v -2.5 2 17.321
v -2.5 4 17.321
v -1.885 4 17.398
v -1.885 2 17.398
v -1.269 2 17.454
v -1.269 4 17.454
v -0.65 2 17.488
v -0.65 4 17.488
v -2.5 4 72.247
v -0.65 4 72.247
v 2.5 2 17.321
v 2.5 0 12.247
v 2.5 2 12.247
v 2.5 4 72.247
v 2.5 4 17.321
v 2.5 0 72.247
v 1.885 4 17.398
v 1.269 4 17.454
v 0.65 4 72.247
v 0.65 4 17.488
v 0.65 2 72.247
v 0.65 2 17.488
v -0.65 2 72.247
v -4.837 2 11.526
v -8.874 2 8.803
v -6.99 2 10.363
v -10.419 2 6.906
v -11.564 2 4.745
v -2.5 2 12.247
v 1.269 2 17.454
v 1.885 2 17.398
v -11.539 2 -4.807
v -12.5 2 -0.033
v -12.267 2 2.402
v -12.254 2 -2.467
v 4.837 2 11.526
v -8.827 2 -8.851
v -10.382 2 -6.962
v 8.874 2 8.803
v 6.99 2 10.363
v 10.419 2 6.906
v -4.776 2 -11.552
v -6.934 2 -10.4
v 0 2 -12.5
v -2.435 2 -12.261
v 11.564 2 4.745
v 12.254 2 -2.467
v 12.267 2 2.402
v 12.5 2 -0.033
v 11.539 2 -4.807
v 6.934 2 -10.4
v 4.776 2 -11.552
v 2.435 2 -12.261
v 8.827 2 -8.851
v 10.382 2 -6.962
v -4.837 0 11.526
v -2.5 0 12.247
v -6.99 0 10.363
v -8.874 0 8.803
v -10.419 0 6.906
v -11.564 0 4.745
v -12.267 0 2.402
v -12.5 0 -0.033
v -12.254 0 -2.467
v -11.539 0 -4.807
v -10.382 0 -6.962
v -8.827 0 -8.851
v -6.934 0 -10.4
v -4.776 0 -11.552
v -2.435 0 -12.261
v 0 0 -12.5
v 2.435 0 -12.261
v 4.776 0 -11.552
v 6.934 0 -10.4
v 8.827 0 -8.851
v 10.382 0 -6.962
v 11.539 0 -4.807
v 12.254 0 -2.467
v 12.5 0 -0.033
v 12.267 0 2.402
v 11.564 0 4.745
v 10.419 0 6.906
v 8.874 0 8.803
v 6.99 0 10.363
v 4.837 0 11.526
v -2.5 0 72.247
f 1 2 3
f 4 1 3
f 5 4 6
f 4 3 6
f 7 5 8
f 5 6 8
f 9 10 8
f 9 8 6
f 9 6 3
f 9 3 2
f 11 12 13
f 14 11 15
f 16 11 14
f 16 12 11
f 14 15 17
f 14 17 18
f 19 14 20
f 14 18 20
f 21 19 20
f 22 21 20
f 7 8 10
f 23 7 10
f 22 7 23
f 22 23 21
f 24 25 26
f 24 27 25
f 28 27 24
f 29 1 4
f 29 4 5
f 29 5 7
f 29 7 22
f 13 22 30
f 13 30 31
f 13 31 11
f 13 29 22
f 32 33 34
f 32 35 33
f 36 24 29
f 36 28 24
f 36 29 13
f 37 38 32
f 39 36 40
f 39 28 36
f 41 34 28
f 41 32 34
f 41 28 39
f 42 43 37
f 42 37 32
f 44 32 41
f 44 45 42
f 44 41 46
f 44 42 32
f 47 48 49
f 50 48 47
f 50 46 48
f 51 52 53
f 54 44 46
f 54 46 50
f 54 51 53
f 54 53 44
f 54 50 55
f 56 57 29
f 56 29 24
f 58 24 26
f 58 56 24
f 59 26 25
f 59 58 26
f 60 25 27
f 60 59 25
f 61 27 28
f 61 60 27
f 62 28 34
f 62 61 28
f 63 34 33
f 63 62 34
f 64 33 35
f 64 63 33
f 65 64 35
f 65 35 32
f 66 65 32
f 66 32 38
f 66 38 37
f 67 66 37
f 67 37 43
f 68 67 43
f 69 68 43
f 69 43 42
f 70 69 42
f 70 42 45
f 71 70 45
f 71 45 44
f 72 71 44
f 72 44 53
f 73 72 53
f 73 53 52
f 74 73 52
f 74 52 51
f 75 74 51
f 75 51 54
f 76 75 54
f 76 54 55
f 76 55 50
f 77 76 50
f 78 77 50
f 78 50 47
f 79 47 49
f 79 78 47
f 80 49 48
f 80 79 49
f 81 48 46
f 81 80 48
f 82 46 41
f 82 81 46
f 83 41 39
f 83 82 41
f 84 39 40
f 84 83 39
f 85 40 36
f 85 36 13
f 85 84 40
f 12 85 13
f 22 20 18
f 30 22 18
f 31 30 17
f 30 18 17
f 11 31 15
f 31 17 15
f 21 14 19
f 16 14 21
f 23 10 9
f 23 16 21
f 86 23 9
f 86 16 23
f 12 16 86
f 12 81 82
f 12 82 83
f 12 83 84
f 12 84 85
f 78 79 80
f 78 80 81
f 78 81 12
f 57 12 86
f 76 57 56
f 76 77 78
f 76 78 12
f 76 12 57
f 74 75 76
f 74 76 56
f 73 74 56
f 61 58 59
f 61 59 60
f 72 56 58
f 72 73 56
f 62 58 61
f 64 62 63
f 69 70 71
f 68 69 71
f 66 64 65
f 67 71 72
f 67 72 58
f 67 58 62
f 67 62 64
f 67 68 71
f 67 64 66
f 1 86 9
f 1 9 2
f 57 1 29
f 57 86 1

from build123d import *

# Parameters (mm, degrees)
BOSS_EXTRUDE1_DEPTH = 4
SKETCH3_R           = 17.5
CUT_EXTRUDE1_DEPTH  = 2
CUT_EXTRUDE2_DEPTH  = 2


with BuildPart() as part:
    # Sketch1 → Boss-Extrude1 (new body)
    with BuildSketch(Plane(origin=(0, 0, 0), x_dir=(1, 0, 0), z_dir=(0, 1, 0))):
        with BuildLine():
            Line((2.5, -72.247448714), (-2.5, -72.247448714))
            Line((-2.5, -72.247448714), (-2.5, -12.247448714))
            ThreePointArc((-2.5, -12.247448714), (0, 12.5), (2.5, -12.247448714))
            Line((2.5, -12.247448714), (2.5, -72.247448714))
        make_face()
    extrude(amount=BOSS_EXTRUDE1_DEPTH)

    # Sketch3 → Cut-Extrude1 (cut)
    with BuildSketch(Plane(origin=(0, 4, 0), x_dir=(1, 0, 0), z_dir=(0, 1, 0))):
        Circle(SKETCH3_R)
    extrude(amount=-CUT_EXTRUDE1_DEPTH, mode=Mode.SUBTRACT)

    # Sketch4 → Cut-Extrude2 (cut)
    with BuildSketch(Plane(origin=(0, 4, 0), x_dir=(1, 0, 0), z_dir=(0, 1, 0))):
        with BuildLine():
            Line((-0.65, -17.487924405), (-0.65, -72.247448714))
            Line((-0.65, -72.247448714), (0.65, -72.247448714))
            Line((0.65, -72.247448714), (0.65, -17.487924405))
            ThreePointArc((0.65, -17.487924405), (0, -17.5), (-0.65, -17.487924405))
        make_face()
    extrude(amount=-CUT_EXTRUDE2_DEPTH, mode=Mode.SUBTRACT)


solid = part.part
